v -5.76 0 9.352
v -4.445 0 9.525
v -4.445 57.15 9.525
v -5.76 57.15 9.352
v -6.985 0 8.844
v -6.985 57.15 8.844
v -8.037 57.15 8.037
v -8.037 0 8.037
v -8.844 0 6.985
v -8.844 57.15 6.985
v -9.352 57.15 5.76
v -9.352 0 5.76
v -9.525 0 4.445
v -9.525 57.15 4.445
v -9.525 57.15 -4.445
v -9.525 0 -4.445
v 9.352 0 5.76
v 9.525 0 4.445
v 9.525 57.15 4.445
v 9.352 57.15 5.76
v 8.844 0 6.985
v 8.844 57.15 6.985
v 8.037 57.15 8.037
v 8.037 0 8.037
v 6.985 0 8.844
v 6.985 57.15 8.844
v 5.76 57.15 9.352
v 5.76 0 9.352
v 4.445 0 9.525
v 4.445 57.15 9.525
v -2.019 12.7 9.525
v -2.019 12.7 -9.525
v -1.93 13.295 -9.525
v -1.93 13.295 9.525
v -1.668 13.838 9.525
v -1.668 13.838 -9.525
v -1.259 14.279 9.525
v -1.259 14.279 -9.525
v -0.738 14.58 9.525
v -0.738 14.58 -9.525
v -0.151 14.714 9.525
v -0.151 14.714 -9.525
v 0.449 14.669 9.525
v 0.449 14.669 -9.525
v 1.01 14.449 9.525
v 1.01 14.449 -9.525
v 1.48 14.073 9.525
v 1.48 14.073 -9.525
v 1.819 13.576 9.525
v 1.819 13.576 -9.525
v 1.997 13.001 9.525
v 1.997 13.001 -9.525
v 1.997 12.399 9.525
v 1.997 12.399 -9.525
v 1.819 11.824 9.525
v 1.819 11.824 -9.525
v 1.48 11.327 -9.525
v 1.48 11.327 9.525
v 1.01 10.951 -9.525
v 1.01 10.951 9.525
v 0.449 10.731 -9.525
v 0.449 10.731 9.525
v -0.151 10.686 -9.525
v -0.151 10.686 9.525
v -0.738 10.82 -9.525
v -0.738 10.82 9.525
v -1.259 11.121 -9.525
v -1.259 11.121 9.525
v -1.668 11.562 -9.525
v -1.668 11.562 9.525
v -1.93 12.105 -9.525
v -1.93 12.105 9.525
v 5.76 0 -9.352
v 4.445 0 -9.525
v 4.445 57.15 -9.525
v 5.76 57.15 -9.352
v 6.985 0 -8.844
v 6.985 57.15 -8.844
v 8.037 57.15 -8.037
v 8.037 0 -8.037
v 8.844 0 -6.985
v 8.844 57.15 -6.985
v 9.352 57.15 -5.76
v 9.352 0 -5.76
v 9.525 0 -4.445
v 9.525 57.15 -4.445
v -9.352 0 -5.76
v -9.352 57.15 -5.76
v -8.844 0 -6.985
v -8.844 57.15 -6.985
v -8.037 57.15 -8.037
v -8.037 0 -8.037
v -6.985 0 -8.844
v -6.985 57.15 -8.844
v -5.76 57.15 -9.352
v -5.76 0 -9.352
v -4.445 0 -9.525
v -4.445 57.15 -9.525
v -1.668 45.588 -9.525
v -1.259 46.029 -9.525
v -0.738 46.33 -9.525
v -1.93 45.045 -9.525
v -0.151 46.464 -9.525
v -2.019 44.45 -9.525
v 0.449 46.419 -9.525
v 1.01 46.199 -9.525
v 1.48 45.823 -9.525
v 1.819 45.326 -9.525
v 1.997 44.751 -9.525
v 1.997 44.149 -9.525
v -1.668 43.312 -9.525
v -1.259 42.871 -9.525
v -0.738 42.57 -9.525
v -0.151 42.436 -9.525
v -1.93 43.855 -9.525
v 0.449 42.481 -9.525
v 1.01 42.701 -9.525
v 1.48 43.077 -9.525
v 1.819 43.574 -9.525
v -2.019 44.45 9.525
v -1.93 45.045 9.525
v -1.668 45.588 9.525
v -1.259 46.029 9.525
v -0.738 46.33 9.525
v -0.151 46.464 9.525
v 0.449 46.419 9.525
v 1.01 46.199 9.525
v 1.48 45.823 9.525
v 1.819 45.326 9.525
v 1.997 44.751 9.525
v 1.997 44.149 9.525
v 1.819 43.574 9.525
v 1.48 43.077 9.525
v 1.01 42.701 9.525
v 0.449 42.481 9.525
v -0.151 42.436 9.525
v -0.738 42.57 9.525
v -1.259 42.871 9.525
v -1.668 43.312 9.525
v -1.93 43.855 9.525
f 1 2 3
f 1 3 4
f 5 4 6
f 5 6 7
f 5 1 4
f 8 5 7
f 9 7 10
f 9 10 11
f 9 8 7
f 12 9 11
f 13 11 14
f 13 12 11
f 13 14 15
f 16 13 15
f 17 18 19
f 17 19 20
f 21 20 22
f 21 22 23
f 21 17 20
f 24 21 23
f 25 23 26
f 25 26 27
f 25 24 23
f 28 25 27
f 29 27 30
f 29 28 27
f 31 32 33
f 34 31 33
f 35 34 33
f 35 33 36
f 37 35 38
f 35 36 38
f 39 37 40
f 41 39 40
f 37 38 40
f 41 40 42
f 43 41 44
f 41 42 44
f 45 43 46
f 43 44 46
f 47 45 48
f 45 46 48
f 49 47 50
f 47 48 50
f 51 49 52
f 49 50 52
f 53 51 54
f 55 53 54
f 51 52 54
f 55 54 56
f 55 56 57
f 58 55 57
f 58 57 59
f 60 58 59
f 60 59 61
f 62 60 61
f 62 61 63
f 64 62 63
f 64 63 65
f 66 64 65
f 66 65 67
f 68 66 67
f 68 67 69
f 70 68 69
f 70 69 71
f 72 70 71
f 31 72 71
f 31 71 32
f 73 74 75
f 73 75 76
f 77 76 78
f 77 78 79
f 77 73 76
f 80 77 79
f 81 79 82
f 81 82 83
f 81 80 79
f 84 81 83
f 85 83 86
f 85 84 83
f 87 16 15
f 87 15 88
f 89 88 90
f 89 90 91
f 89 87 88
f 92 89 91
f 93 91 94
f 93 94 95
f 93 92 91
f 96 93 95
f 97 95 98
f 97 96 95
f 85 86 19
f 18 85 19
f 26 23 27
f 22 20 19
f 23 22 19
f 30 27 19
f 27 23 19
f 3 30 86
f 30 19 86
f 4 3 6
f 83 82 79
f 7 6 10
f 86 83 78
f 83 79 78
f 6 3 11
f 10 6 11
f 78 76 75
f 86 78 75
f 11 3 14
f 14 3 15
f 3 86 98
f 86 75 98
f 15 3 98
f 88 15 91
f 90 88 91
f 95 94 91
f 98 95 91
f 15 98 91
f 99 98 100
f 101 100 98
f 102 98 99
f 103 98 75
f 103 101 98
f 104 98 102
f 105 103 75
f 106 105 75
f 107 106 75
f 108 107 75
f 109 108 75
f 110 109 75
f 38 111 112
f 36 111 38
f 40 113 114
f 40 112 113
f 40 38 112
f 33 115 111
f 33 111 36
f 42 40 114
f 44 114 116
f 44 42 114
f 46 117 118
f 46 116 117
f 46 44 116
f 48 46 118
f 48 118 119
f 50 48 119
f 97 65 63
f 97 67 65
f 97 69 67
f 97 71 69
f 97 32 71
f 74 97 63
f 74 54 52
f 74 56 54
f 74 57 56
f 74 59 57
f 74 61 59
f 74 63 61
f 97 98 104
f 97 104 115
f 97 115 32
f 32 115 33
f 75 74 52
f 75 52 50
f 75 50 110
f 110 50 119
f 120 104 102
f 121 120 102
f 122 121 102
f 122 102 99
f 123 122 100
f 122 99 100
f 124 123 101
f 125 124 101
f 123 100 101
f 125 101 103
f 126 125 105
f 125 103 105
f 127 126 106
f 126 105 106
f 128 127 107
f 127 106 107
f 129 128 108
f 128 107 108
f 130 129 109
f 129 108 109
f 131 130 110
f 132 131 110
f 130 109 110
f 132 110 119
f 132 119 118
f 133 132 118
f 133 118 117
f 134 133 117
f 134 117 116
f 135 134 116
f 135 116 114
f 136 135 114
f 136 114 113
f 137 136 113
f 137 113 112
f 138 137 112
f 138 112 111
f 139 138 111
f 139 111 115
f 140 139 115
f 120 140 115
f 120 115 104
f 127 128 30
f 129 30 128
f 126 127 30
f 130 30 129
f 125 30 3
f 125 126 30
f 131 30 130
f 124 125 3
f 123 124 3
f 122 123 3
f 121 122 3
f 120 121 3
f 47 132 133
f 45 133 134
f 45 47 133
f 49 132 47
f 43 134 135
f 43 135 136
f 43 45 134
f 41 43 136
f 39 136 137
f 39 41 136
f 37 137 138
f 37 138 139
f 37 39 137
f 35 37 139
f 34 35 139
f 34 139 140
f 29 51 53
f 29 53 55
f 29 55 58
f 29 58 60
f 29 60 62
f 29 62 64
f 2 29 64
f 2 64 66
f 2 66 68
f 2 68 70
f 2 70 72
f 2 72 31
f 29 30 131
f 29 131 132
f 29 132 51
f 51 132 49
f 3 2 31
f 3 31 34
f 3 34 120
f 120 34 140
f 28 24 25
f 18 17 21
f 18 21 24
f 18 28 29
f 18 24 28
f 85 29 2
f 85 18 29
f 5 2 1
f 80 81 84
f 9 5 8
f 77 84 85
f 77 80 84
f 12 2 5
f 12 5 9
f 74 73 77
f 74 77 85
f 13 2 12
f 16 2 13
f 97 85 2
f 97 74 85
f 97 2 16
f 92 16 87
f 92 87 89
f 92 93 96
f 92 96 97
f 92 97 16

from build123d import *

# Parameters (mm, degrees)
BOSS_EXTRUDE1_DEPTH    = 57.15
F_10_32_TAPPED_HOLE1_D = 4.0386


with BuildPart() as part:
    # Sketch1 → Boss-Extrude1 (new body)
    with BuildSketch(Plane(origin=(0, 0, 0), x_dir=(1, 0, 0), z_dir=(0, 1, 0))):
        with BuildLine():
            Line((-4.445, 9.525), (4.445, 9.525))
            ThreePointArc((4.445, 9.525), (8.037102448, 8.037102448), (9.525, 4.445))
            Line((9.525, 4.445), (9.525, -4.445))
            ThreePointArc((9.525, -4.445), (8.037102448, -8.037102448), (4.445, -9.525))
            Line((4.445, -9.525), (-4.445, -9.525))
            ThreePointArc((-4.445, -9.525), (-8.037102448, -8.037102448), (-9.525, -4.445))
            Line((-9.525, -4.445), (-9.525, 4.445))
            ThreePointArc((-9.525, 4.445), (-8.037102448, 8.037102448), (-4.445, 9.525))
        make_face()
    extrude(amount=BOSS_EXTRUDE1_DEPTH)

    # #10-32 Tapped Hole1 (through all)
    with Locations(Plane.XY.offset(9.525)):
        with Locations((0, 44.45), (0, 12.7)):
            Hole(F_10_32_TAPPED_HOLE1_D / 2)


solid = part.part
